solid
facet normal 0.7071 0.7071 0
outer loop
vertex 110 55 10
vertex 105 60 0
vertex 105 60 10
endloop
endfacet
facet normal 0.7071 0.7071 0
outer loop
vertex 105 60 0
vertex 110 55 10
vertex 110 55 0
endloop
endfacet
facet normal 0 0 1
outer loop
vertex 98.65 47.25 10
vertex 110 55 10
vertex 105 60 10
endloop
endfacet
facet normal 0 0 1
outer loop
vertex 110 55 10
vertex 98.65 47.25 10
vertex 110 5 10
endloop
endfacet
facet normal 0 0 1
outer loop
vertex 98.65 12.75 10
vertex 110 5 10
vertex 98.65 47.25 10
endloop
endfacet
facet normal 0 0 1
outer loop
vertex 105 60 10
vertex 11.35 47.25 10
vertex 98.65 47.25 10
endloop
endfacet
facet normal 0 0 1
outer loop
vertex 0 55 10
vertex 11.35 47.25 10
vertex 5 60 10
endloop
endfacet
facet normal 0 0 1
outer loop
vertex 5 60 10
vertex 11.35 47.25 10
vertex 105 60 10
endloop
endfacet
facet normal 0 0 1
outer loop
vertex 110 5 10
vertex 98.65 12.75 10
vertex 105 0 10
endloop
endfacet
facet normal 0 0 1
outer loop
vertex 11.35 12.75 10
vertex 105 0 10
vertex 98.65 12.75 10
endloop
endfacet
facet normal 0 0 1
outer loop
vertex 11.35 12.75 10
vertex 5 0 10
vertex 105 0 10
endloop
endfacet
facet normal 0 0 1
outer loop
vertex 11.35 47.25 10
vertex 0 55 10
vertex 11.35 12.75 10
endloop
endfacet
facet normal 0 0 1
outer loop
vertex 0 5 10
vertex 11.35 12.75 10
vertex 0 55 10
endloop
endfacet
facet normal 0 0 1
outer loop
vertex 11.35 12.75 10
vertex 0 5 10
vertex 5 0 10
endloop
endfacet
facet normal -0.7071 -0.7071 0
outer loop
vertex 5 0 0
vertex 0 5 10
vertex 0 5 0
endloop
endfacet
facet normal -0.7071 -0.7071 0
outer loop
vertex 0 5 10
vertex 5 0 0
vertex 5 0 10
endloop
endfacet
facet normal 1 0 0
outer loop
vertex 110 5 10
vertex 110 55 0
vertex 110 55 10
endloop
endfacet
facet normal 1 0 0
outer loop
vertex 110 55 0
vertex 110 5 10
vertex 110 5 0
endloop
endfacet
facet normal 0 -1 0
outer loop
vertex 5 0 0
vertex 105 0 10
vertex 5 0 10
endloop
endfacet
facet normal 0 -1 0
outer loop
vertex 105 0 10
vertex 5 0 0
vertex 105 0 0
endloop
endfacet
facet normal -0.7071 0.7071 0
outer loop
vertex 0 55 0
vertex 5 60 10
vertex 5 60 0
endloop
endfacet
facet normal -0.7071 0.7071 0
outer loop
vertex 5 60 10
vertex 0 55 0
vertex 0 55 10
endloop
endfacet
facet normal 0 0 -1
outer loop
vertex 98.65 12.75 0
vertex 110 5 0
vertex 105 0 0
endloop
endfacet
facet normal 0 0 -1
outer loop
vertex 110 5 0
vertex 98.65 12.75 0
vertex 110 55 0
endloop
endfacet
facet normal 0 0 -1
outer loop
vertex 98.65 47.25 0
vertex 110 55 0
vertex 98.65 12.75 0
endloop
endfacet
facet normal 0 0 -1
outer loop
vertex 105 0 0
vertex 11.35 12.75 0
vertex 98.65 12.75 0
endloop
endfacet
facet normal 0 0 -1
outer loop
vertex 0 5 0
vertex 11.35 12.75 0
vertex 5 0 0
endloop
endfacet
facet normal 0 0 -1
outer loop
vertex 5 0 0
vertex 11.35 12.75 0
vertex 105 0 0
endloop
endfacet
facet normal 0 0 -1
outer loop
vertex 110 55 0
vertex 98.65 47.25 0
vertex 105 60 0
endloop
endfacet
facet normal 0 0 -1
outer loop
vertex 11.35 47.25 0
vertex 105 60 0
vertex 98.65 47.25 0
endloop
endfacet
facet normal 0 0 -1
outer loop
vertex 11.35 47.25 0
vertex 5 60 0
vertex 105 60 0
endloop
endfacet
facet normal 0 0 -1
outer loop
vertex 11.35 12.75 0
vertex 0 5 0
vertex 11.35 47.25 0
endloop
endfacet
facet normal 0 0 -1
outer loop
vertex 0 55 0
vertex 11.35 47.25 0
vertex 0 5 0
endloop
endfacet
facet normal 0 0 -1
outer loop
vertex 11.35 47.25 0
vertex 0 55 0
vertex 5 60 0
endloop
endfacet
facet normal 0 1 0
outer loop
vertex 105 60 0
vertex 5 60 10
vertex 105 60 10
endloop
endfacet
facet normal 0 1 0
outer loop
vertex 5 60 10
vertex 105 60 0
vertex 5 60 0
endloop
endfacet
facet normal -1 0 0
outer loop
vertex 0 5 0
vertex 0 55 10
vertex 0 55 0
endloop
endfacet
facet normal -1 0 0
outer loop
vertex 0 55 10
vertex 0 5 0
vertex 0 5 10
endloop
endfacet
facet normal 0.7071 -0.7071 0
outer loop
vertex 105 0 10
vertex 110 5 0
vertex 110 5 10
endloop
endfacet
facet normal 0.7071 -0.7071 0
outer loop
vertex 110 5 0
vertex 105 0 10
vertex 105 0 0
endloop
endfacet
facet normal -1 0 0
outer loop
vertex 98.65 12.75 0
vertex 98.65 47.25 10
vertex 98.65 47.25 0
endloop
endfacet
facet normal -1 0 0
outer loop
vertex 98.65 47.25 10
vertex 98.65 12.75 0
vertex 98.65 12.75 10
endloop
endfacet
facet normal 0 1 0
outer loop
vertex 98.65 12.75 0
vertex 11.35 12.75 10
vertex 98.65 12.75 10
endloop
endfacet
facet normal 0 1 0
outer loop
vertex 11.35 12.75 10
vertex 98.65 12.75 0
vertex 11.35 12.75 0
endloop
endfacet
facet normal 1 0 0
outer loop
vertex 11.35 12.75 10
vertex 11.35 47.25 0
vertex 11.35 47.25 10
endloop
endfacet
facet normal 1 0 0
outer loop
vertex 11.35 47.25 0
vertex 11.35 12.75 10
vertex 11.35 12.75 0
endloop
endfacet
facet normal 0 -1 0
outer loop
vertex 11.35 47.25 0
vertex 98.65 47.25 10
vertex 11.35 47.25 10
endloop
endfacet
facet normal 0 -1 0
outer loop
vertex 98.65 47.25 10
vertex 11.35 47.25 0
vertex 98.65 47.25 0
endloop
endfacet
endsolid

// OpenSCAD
$fn = 32;

// ----------------------------------------------------------------------
// Windowed plate: 1 voids, 110 x 60 x 10 mm
// ----------------------------------------------------------------------

// --- parameters (mm) ---
plate_l = 110;            // plate length, X
plate_w = 60;             // plate width, Y
plate_t = 10;             // plate thickness, Z
edge_margin = 8;          // wall from the plate edge to any window
win1_l = 87.3;            // window length
win1_w = 34.5;            // window width
depth_1 = 10;             // depth of void 1 (full thickness = through)
corner_c = 5;             // corner chamfer of the plate

profile = [[5, 0], [105, 0], [110, 5], [110, 55], [105, 60], [5, 60], [0, 55], [0, 5]];  // primary outline, 8 points, counter clockwise
void_1 = [[11.35, 12.75], [98.65, 12.75], [98.65, 47.25], [11.35, 47.25]];  // large central window, 4 points

// --- the one profile operation ---
difference() {
  linear_extrude(height = plate_t) polygon(points = profile);
  translate([0, 0, -1])
    linear_extrude(height = plate_t + 2) polygon(points = void_1);
}
